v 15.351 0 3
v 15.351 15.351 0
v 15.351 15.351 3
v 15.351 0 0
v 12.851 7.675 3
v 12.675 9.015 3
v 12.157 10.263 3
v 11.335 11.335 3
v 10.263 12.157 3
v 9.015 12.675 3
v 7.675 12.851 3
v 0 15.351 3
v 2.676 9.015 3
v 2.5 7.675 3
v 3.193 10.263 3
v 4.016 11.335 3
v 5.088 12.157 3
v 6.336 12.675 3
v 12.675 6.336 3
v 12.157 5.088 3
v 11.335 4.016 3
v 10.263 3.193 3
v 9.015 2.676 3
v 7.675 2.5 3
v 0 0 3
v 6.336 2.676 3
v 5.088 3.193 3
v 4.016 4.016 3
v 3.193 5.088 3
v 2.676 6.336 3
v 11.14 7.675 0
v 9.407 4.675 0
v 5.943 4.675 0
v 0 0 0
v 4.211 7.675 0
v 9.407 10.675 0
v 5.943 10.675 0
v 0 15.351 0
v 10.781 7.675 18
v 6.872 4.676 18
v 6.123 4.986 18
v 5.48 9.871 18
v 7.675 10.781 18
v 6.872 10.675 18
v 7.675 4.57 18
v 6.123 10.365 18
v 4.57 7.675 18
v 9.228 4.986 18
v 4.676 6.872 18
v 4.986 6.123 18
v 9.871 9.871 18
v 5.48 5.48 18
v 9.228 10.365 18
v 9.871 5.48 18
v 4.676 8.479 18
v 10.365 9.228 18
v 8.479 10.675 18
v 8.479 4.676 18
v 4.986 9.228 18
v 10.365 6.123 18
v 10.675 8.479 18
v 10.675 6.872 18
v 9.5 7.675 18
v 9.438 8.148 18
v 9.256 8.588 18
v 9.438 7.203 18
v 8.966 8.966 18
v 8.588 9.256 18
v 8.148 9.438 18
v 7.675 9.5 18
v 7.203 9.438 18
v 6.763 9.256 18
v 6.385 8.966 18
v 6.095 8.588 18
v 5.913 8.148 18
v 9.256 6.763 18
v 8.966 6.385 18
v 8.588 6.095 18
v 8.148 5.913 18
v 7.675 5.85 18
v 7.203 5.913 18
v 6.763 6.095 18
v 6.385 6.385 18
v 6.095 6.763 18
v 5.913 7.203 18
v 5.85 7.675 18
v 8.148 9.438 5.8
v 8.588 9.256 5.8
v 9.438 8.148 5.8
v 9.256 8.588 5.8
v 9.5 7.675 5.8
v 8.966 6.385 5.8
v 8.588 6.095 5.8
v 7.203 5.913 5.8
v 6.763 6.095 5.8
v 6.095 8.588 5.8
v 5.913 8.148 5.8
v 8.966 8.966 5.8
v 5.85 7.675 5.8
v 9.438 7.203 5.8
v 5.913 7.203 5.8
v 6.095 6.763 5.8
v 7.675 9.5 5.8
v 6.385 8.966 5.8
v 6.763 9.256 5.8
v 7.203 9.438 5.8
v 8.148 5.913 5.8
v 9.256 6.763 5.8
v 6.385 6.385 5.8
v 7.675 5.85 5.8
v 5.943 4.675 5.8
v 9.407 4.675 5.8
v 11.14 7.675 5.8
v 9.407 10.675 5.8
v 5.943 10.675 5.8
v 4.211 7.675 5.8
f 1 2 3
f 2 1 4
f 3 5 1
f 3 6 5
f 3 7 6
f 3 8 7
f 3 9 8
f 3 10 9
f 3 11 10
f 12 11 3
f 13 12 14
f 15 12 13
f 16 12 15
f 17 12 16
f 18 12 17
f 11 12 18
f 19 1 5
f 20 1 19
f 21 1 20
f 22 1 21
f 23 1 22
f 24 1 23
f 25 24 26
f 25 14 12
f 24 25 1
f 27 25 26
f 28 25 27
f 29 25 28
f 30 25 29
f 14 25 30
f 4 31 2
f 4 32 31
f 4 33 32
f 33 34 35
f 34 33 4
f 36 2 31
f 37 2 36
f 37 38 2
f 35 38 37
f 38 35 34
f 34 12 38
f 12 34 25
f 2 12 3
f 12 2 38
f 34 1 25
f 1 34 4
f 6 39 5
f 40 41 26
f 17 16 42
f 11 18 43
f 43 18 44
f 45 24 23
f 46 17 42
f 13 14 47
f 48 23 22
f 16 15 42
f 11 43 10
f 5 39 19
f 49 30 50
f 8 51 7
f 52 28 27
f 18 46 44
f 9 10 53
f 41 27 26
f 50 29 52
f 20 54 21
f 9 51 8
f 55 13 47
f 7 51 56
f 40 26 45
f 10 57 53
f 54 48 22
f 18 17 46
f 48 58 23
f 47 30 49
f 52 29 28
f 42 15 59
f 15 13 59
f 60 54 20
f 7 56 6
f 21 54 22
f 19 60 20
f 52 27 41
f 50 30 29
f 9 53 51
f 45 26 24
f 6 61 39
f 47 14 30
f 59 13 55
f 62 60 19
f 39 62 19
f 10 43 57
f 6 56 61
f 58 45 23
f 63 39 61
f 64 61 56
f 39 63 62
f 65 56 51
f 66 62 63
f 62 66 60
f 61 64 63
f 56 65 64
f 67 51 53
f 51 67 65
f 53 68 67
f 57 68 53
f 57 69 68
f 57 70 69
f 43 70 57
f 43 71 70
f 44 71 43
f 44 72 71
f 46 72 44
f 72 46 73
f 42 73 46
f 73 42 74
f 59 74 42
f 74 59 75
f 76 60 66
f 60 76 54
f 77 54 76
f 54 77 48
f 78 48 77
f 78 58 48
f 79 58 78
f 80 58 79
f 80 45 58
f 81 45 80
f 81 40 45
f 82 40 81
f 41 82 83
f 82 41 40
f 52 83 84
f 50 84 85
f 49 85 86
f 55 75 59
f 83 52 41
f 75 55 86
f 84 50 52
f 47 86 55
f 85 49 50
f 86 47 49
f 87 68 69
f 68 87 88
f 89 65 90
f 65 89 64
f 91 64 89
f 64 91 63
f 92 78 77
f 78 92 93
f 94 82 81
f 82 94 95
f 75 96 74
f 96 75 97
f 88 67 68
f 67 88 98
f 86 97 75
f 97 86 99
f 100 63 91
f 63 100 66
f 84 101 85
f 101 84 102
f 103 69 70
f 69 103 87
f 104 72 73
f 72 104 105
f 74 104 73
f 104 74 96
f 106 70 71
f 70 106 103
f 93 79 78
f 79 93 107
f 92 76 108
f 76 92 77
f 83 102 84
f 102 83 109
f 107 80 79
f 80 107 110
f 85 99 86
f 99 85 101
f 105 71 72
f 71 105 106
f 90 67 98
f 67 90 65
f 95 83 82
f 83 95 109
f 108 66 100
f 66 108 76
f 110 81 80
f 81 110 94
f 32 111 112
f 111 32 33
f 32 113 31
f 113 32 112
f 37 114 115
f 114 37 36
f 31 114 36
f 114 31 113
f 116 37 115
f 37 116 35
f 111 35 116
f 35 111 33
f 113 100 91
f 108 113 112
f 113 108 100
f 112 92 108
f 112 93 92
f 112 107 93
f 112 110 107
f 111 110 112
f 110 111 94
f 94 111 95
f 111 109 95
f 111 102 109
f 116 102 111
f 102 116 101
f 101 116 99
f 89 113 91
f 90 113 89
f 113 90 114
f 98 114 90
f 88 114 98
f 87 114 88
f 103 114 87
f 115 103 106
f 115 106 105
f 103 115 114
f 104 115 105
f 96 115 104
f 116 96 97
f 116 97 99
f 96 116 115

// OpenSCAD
// file: ../screw_post.scad
// Screw Post Library
// ネジ止め用ポスト（ナットポケット付き）ライブラリ
//
// 提供モジュール:
//   screw_post(size, h, d_top, d_base)     - ポスト本体（円錐形）
//   screw_post_hole(size, h, nut_side)     - ネジ穴 + ナットポケット（difference用）
//   screw_post_with_hole(...)              - ポスト + 穴の一体型
//
// 対応サイズ: M2, M2.5, M3
//
// 使用例:
//   difference() {
//       screw_post("M2.5", h = 10);
//       // ネジ長さと材料厚さから自動計算
//       screw_post_hole("M2.5", h = 10, screw_length = 8, material_thickness = 1.6);
//   }

// ===== ネジ・ナット寸法テーブル =====
// [ネジ通し穴径, ナット二面幅, ナット厚さ]

function screw_specs(size) =
    size == "M2"   ? [2.4, 4.0, 1.6] :
    size == "M2.5" ? [2.7, 5.0, 2.0] :
    size == "M3"   ? [3.4, 5.5, 2.4] :
    undef;

// トレランス付きナット寸法を取得
// tolerance: 穴径・ナット幅に追加するクリアランス
function screw_specs_with_tolerance(size, tolerance = 0.5) =
    let(specs = screw_specs(size))
    is_undef(specs) ? undef :
    [specs[0] + tolerance * 0.5,    // ネジ穴は控えめに
     specs[1] + tolerance,          // ナット幅
     specs[2] + tolerance * 0.8];   // ナット深さ

// 推奨ポスト径（ナット収容可能なサイズ）
function screw_post_d(size, wall = 2) =
    let(specs = screw_specs(size))
    is_undef(specs) ? 0 : specs[1] / cos(30) + wall * 2;

// ナットポケット深さを自動計算
// h: ポスト高さ
// screw_length: ネジの長さ
// material_thickness: 間に挟む材料の厚さ（PCB等）
// 戻り値: ナットポケットがポスト底面からどこまで伸びるか
function calc_nut_depth(h, screw_length, material_thickness = 0) =
    let(
        // ネジ先端位置（ポスト底面からの高さ）
        screw_tip = h + material_thickness - screw_length,
        // ナットが噛み合うための余裕（2mm）
        engagement = 2
    )
    screw_tip + engagement;

// ===== モジュール =====

// ポスト本体（円錐形、底部が広い）
// h: ポスト高さ
// d_top: 上部直径（省略時は推奨値の60%）
// d_base: 底部直径（省略時は推奨値）
module screw_post(size = "M2.5", h = 10, d_top = undef, d_base = undef) {
    specs = screw_specs(size);

    if (is_undef(specs)) {
        echo(str("ERROR: Invalid screw size '", size, "'"));
    } else {
        base_d = is_undef(d_base) ? screw_post_d(size) : d_base;
        top_d = is_undef(d_top) ? base_d * 0.6 : d_top;

        cylinder(h = h, d1 = base_d, d2 = top_d, $fn = 24);
    }
}

// ネジ穴 + ナットポケット（difference用）
// h: ポスト高さ（ネジ穴の長さ）
// nut_side: ナットポケットの位置 "bottom" または "top"
// screw_length: ネジの長さ（指定時は nut_depth を自動計算）
// material_thickness: 間に挟む材料の厚さ（PCB等、screw_length と併用）
// nut_depth: ナットポケットの深さ（直接指定、screw_length より優先）
// base_thickness: ベース板の厚さ（nut_side="bottom" 時に貫通させる）
// tolerance: クリアランス
module screw_post_hole(size = "M2.5", h = 10, nut_side = "bottom",
                       screw_length = undef, material_thickness = 0,
                       nut_depth = undef, base_thickness = 3, tolerance = 0.5) {
    specs = screw_specs_with_tolerance(size, tolerance);

    if (is_undef(specs)) {
        echo(str("ERROR: Invalid screw size '", size, "'"));
    } else {
        screw_d = specs[0];
        nut_w = specs[1];

        // nut_depth の決定: 直接指定 > 自動計算 > デフォルト
        nut_h = !is_undef(nut_depth) ? nut_depth :
                !is_undef(screw_length) ? calc_nut_depth(h, screw_length, material_thickness) :
                specs[2];

        hex_d = nut_w / cos(30);  // 六角形の外接円直径

        // ネジ穴（貫通）
        translate([0, 0, -0.1])
            cylinder(h = h + 0.2, d = screw_d, $fn = 24);

        // ナットポケット
        if (nut_side == "bottom") {
            // 底面から（ベース板を貫通、最低でもベース厚 + ナット厚を確保）
            nut_pocket_h = max(base_thickness + nut_h, base_thickness + specs[2]);
            translate([0, 0, -base_thickness - 0.1])
                cylinder(h = nut_pocket_h + 0.1, d = hex_d, $fn = 6);
        } else if (nut_side == "top") {
            // 上面から
            translate([0, 0, h - nut_h])
                cylinder(h = nut_h + 0.1, d = hex_d, $fn = 6);
        }
    }
}

// ポスト + 穴の一体型（便利モジュール）
module screw_post_with_hole(size = "M2.5", h = 10, d_top = undef, d_base = undef,
                            nut_side = "bottom",
                            screw_length = undef, material_thickness = 0,
                            nut_depth = undef,
                            base_thickness = 3, tolerance = 0.5) {
    difference() {
        screw_post(size, h, d_top, d_base);
        screw_post_hole(size, h, nut_side, screw_length, material_thickness,
                        nut_depth, base_thickness, tolerance);
    }
}

// サイズ別便利モジュール
module m2_screw_post(h = 10, d_top = undef, d_base = undef) {
    screw_post("M2", h, d_top, d_base);
}

module m2p5_screw_post(h = 10, d_top = undef, d_base = undef) {
    screw_post("M2.5", h, d_top, d_base);
}

module m3_screw_post(h = 10, d_top = undef, d_base = undef) {
    screw_post("M3", h, d_top, d_base);
}
// main file
// Screw Post テストピース
// ナットポケットのフィット確認用
//
// 外形: 16mm x 16mm x 18mm (wall 3mm + post 15mm)
// 使用ネジ: M3 x 20mm
//
// ビルド:
//   openscad -o screw_post_test.stl screw_post_test.scad

use <../screw_post.scad>

// ===== パラメータ =====
size = "M3";
wall_thickness = 3;
post_h = 15;
pcb_thickness = 1.6;
// 理想的なネジ長さ ≒ post_h + wall_thickness + pcb_thickness = 19.6mm → 20mm
screw_len = 20;

// レイアウト
margin = 2.5;
post_d = screw_post_d(size);
base_size = post_d + margin * 2;

// ===== テストピース =====
difference() {
    union() {
        // ベース板
        cube([base_size, base_size, wall_thickness]);

        // ポスト
        translate([base_size/2, base_size/2, wall_thickness])
            screw_post(size, h = post_h);
    }

    // ネジ穴 + ナットポケット
    translate([base_size/2, base_size/2, wall_thickness])
        screw_post_hole(size, h = post_h,
                        screw_length = screw_len,
                        material_thickness = pcb_thickness,
                        base_thickness = wall_thickness);
}
